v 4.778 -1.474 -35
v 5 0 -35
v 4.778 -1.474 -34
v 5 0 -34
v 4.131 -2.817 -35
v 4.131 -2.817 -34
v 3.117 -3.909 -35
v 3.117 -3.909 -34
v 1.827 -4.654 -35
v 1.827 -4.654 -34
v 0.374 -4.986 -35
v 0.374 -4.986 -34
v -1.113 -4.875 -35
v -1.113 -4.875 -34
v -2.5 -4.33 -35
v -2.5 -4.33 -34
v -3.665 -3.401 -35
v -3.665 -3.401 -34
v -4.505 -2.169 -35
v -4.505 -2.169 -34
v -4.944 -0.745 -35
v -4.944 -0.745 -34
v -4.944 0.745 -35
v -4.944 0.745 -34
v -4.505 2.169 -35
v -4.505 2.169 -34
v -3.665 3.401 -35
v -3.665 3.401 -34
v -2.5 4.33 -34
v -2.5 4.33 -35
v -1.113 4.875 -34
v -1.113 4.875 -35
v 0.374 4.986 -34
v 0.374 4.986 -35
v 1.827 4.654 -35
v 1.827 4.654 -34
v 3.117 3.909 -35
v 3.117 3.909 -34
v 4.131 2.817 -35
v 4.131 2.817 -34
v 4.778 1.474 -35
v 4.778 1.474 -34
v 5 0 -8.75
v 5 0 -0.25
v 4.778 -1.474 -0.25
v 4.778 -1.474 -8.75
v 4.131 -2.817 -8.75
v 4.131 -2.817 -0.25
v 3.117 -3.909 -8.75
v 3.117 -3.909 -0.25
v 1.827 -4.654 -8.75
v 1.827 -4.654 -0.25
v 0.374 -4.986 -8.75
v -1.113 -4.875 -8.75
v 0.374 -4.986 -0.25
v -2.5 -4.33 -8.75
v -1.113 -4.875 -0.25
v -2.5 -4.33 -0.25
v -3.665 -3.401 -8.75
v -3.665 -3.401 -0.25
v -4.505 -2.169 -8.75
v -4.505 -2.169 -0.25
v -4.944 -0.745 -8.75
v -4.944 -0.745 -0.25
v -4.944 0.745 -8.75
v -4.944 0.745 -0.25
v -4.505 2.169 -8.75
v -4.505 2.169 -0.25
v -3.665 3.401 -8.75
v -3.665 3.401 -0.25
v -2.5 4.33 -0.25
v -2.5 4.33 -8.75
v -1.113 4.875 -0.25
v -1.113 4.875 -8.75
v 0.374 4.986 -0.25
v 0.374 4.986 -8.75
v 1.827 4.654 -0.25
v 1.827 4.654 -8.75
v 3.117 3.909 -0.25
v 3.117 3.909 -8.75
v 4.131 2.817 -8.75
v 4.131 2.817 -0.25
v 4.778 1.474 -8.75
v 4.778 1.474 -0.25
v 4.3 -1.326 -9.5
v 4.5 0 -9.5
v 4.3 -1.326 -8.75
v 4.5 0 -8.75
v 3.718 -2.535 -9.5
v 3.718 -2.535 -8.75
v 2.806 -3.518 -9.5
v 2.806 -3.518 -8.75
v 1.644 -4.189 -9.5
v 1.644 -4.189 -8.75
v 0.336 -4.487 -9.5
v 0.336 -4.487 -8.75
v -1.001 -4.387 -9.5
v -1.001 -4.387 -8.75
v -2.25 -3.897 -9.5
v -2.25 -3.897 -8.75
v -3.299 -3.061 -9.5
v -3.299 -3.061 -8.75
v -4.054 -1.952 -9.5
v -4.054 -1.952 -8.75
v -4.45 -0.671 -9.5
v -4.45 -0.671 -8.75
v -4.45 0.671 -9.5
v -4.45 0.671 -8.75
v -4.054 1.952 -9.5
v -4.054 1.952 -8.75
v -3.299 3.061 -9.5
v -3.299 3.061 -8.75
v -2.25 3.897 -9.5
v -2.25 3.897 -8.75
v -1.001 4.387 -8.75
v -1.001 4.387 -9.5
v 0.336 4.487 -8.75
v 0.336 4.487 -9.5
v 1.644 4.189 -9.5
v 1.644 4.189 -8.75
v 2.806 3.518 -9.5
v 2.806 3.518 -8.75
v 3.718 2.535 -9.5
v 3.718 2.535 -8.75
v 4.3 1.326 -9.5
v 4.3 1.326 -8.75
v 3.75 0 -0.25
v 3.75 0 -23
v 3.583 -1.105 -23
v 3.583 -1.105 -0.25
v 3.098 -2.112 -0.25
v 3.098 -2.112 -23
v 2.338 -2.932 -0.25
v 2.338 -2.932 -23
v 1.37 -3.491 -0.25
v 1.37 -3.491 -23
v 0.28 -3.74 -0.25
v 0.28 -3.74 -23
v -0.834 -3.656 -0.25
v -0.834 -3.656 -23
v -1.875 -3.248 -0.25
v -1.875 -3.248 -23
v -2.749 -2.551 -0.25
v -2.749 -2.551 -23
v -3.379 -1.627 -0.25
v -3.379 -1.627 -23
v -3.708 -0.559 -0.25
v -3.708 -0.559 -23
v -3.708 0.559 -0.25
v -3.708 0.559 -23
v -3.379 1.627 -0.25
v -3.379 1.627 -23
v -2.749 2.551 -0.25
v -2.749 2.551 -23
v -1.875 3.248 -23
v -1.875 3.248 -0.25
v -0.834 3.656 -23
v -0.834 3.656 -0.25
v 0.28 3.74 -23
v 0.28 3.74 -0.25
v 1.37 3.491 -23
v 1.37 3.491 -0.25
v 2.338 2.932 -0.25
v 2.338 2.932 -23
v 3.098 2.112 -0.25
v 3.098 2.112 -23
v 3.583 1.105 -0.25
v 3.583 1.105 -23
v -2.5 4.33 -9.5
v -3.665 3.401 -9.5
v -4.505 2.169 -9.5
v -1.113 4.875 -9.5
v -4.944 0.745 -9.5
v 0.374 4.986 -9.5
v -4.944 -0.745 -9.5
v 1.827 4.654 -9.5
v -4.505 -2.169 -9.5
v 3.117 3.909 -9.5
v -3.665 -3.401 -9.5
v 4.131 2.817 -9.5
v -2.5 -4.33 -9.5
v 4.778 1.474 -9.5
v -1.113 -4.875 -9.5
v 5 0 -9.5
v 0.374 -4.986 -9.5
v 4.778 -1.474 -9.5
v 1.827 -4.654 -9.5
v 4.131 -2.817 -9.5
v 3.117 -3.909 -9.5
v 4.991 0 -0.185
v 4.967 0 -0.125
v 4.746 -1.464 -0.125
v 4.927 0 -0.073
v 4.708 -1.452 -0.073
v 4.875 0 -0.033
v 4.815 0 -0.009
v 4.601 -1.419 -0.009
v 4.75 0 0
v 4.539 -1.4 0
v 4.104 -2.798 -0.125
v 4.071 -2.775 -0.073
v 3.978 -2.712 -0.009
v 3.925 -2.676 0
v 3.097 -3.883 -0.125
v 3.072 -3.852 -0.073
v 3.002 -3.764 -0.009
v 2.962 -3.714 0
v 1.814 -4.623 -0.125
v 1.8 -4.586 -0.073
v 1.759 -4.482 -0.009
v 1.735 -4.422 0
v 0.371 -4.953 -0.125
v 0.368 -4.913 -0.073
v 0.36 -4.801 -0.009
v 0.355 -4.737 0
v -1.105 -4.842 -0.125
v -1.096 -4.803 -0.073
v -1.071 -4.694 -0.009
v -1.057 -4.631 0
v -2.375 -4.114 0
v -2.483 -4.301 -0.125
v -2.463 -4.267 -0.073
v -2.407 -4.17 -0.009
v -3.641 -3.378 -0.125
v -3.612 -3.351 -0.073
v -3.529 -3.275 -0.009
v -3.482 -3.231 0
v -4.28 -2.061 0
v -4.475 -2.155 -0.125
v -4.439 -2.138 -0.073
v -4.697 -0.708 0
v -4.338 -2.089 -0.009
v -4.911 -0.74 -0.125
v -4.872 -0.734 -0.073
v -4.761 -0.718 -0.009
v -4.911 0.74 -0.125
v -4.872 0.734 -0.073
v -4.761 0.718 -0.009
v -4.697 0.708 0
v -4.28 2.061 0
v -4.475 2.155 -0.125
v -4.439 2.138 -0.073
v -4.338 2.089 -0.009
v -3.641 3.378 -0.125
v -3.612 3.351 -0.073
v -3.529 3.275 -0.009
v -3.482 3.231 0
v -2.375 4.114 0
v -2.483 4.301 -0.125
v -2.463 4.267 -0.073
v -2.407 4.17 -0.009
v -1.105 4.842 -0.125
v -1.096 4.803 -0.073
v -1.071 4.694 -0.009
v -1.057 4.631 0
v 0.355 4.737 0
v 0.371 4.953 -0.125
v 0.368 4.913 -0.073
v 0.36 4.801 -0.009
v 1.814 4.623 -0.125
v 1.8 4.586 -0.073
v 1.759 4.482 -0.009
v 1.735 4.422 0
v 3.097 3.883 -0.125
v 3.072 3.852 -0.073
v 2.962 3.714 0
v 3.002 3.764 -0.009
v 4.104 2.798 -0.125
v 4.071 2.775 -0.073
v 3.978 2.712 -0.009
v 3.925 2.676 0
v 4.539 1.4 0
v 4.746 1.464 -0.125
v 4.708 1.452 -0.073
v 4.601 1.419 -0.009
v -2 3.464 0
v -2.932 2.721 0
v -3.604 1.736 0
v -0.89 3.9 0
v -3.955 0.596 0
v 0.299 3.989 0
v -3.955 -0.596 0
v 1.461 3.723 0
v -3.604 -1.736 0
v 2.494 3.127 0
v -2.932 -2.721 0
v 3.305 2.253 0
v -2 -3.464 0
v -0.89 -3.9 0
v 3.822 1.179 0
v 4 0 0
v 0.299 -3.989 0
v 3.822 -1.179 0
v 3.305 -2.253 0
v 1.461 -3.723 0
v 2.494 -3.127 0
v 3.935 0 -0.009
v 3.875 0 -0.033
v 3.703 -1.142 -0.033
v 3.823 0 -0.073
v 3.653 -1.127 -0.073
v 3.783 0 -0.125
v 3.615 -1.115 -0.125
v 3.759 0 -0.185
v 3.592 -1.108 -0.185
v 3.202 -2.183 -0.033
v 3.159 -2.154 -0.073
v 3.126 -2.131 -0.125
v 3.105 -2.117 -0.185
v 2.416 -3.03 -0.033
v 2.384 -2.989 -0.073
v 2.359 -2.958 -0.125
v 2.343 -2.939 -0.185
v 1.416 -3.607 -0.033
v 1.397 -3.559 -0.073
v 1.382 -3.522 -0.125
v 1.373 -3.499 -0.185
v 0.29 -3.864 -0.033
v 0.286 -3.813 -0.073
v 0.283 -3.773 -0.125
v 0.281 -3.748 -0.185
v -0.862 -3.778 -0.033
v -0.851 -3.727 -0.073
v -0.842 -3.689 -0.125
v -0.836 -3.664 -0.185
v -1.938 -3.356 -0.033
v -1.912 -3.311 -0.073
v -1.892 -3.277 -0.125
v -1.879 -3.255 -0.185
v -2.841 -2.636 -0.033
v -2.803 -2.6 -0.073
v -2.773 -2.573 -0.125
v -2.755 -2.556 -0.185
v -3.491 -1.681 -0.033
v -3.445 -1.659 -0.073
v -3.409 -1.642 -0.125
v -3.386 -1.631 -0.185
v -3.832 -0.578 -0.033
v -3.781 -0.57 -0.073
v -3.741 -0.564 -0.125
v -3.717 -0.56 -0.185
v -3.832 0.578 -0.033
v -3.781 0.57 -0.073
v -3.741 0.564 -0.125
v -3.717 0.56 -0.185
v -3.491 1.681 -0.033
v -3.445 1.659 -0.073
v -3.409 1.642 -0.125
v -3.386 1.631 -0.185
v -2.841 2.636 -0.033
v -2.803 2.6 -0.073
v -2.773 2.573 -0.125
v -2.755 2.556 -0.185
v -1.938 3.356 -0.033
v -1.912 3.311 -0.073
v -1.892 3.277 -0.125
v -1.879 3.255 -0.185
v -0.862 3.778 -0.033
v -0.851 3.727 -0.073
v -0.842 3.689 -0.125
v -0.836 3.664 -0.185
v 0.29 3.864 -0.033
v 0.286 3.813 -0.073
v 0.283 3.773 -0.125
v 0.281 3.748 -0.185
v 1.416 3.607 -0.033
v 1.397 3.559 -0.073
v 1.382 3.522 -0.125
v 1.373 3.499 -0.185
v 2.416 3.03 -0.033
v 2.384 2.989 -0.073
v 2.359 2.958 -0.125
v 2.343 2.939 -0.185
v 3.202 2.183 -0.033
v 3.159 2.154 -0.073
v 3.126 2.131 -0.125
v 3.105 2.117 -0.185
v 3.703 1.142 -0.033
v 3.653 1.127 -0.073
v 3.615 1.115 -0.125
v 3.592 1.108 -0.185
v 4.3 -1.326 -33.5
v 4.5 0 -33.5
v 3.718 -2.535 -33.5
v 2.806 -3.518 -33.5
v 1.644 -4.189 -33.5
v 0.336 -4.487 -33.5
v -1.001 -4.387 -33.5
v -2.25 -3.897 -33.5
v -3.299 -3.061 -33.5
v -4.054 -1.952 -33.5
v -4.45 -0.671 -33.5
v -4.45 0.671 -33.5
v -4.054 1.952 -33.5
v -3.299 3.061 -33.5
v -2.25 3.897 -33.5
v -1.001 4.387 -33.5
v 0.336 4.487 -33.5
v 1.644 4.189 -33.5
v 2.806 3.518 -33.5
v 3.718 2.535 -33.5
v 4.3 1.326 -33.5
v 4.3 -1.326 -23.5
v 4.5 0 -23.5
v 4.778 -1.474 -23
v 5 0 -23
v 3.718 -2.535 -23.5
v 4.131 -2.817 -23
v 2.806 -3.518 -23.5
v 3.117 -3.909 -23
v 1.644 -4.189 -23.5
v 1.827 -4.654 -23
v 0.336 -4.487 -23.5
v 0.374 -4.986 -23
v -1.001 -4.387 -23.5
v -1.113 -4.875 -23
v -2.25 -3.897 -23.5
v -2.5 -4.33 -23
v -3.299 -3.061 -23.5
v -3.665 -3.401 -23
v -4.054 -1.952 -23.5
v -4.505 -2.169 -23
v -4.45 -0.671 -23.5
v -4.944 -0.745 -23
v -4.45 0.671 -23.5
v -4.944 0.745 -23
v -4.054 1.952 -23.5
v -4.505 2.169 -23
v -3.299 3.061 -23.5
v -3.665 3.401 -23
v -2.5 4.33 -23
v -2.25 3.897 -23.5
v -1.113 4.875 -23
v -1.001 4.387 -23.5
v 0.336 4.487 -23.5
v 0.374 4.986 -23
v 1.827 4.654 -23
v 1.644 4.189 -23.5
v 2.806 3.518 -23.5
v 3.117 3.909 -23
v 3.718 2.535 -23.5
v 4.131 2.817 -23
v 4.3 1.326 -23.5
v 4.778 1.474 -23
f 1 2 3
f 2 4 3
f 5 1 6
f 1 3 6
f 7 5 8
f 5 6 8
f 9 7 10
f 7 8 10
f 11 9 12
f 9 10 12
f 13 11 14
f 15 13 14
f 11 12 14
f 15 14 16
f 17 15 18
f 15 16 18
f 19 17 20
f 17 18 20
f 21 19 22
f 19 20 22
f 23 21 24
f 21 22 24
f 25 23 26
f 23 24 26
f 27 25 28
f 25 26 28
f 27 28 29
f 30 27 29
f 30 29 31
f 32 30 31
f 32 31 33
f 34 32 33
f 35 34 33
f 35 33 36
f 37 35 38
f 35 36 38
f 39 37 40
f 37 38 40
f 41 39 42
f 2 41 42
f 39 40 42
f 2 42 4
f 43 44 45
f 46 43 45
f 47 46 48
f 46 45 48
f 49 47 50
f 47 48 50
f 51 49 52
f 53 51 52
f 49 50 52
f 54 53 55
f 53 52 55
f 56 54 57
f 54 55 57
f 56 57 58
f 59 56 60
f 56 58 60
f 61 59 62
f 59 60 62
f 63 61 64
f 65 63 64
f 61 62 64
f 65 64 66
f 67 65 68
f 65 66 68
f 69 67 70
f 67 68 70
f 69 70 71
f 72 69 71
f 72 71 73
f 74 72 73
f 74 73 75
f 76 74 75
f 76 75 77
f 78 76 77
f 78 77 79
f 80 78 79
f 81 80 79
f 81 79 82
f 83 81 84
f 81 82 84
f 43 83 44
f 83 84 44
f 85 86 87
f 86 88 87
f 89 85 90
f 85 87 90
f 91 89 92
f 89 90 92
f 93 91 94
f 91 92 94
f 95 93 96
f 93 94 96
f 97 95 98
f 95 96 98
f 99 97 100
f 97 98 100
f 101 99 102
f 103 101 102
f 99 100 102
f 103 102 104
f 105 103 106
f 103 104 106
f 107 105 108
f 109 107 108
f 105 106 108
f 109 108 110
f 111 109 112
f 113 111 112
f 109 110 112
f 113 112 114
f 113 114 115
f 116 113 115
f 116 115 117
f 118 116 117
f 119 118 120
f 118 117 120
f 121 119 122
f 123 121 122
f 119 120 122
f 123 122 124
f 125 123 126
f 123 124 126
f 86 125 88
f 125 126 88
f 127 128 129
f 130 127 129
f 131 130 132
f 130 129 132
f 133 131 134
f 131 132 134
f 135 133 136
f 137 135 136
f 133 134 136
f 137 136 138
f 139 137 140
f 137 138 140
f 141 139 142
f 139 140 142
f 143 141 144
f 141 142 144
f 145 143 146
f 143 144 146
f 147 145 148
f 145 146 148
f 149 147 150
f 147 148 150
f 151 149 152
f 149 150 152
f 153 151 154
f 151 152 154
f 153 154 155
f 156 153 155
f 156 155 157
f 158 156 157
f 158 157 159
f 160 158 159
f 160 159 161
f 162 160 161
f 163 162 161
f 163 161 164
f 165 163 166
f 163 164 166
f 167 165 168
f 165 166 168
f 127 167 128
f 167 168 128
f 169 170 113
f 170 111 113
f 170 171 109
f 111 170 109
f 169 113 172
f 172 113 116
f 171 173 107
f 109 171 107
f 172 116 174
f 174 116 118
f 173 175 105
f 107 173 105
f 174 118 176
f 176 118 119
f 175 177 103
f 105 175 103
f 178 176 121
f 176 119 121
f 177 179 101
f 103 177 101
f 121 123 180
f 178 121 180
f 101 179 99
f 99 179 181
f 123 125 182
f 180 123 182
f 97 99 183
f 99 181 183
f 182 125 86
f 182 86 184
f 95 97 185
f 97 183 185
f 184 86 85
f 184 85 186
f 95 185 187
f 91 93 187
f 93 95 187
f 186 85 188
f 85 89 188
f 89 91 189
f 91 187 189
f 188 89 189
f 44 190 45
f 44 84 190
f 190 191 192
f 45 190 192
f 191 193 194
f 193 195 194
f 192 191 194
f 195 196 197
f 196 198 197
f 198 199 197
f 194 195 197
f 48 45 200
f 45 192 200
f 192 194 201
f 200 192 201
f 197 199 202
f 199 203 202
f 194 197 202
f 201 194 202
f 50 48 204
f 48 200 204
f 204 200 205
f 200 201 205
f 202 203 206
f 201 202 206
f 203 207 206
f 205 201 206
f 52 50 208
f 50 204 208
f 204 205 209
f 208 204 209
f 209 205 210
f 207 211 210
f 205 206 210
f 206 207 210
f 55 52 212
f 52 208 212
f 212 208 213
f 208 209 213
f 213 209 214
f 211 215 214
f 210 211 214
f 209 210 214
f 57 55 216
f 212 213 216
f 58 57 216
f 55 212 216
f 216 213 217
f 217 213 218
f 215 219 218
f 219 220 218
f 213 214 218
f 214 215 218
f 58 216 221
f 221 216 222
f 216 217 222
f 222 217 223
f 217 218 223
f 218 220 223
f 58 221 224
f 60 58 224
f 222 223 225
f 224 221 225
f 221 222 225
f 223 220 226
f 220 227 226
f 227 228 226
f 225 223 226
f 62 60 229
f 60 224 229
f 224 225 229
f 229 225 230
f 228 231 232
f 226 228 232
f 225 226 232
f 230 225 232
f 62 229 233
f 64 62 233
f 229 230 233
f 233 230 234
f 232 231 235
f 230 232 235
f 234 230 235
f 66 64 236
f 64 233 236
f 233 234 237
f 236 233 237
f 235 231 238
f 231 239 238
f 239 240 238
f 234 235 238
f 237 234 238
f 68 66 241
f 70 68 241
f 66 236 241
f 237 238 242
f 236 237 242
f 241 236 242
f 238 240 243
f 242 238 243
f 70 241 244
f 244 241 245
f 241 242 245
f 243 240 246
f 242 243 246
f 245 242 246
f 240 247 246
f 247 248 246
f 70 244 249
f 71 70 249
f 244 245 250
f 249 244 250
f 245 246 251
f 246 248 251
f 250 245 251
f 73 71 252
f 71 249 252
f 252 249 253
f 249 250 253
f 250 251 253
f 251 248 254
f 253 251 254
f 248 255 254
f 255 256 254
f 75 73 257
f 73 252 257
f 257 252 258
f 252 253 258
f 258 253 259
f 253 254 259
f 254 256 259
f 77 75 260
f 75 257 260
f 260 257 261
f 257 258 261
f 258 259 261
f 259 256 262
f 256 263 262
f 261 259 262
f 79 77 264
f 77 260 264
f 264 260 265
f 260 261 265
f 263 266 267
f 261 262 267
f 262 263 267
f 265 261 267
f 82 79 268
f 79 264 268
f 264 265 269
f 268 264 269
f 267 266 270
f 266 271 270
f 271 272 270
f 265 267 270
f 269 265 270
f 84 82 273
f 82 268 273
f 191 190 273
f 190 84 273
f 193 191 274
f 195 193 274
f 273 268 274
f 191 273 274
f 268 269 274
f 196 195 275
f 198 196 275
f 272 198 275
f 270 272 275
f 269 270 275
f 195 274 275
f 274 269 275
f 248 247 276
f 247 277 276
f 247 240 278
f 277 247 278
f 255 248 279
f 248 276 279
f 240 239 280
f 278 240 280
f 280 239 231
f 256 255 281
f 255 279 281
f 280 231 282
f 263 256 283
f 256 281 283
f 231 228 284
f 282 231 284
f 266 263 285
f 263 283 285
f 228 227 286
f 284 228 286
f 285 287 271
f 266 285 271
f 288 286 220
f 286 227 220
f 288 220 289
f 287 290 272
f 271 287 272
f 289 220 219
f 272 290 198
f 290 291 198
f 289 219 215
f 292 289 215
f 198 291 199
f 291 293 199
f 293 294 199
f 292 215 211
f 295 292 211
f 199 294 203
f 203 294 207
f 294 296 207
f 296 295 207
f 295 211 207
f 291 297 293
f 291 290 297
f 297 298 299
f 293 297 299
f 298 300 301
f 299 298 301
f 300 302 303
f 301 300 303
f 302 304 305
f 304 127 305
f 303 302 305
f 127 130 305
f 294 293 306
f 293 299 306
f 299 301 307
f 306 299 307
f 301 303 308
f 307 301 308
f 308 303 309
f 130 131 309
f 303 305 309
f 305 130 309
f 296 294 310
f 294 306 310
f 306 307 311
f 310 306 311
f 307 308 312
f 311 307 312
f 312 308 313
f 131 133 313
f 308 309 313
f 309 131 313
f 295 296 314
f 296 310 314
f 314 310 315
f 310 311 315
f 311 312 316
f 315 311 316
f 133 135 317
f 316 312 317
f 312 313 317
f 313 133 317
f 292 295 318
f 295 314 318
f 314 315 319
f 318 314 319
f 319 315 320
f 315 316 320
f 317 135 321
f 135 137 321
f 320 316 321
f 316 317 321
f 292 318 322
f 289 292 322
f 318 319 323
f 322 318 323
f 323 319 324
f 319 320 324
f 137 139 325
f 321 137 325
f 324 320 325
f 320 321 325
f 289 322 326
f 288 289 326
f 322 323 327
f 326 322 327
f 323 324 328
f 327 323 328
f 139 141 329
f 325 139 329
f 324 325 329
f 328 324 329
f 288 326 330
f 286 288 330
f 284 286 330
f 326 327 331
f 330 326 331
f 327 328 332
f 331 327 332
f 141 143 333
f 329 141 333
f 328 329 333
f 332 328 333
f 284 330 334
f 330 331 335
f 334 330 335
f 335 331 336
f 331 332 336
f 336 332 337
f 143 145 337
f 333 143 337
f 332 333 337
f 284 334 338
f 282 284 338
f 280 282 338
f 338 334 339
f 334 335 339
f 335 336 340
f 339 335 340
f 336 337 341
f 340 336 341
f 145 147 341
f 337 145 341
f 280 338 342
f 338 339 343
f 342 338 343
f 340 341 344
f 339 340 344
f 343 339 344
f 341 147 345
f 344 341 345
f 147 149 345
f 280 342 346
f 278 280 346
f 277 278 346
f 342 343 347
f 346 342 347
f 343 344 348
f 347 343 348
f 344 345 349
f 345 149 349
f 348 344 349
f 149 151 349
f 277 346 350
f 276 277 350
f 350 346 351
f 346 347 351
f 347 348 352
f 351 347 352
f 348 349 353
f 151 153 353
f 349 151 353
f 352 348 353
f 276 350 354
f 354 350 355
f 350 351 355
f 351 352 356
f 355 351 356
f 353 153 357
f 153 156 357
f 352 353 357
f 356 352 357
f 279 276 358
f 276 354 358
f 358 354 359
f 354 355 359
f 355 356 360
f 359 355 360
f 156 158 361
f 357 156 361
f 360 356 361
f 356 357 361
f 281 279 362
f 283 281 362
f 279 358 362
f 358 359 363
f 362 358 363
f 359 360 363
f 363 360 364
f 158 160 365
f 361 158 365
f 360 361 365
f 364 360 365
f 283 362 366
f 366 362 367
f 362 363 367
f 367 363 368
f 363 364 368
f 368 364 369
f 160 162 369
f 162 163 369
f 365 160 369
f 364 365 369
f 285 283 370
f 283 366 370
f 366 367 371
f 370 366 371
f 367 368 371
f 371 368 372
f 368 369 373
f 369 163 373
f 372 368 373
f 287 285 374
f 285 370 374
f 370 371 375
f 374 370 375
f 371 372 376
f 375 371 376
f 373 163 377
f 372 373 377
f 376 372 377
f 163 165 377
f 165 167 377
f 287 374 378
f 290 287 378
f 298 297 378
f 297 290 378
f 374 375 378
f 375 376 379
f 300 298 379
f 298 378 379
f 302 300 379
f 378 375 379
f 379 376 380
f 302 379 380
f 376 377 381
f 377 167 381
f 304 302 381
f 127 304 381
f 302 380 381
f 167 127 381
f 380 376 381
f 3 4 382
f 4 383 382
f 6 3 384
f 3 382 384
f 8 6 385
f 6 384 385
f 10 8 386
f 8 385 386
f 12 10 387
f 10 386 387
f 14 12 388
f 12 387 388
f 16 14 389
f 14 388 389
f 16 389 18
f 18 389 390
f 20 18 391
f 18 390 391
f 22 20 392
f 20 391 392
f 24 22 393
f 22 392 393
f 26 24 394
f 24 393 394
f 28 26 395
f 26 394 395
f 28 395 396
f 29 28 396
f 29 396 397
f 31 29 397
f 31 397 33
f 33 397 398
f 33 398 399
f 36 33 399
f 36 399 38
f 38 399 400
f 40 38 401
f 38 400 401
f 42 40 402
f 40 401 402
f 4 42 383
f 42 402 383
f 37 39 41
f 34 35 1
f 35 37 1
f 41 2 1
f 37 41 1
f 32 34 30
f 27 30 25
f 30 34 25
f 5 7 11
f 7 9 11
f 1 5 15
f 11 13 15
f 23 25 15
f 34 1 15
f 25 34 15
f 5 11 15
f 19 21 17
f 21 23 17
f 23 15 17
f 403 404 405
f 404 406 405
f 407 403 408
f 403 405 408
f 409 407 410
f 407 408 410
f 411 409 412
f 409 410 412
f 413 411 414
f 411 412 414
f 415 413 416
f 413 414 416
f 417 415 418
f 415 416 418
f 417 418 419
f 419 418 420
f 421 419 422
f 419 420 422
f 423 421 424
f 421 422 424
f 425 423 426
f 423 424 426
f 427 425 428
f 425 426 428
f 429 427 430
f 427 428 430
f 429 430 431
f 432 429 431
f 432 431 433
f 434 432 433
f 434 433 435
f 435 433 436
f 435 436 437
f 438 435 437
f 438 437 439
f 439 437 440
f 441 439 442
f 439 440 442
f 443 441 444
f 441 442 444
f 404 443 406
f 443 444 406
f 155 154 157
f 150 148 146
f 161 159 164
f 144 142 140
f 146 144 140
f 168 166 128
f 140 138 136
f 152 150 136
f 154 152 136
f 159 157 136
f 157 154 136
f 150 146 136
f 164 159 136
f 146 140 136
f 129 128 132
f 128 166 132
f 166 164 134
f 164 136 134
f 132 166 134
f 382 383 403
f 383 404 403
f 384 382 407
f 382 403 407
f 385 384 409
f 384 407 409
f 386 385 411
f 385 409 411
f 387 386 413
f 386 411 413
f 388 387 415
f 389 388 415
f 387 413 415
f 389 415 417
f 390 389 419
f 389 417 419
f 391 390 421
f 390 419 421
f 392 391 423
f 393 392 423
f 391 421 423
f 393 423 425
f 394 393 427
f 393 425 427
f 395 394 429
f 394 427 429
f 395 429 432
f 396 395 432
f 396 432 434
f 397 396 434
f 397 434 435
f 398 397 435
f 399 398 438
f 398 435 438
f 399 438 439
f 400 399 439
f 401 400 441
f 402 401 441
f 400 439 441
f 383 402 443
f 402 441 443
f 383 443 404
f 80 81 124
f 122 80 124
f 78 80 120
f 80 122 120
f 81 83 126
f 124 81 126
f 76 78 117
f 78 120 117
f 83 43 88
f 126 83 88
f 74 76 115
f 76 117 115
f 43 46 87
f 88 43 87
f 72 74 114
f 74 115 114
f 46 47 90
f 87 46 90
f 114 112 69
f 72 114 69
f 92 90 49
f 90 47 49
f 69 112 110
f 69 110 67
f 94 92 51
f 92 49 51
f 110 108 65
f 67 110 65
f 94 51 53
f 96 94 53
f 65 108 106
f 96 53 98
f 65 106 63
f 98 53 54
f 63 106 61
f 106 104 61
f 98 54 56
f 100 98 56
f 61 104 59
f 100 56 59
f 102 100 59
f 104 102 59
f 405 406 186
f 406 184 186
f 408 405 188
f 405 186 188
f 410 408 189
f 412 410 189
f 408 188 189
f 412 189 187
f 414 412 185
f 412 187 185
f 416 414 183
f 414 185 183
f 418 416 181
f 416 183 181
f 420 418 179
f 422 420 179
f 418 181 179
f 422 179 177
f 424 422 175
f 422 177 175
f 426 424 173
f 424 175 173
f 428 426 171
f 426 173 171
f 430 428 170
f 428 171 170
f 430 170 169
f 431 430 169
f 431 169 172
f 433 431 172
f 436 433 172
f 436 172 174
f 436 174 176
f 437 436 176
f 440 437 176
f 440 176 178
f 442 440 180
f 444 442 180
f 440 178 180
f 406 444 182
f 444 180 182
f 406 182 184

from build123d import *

# Parameters (mm, degrees)
FILLET_1_R = 0.25


with BuildPart() as part:
    # Эскиз1 → Повернуть1 (revolve)
    with BuildSketch(Plane(origin=(0, 0, 0), x_dir=(0, 0, -1), z_dir=(1, 0, 0)), mode=Mode.PRIVATE) as revolve_1_sk:
        Polygon((23, 0), (35, 0), (35, 5), (34, 5), (33.5, 4.5), (23.5, 4.5), (23, 5), (9.5, 5), (9.5, 4.5), (8.75, 4.5), (8.75, 5), (0, 5), (0, 3.75), (23, 3.75), align=None)
    revolve(revolve_1_sk.sketch.rotate(Axis((0, 0, -23), (0, 0, -1)), 90), axis=Axis((0, 0, -23), (0, 0, -1)))

    # Скругление1
    fillet_1_edges = [part.edges().sort_by_distance(p)[0] for p in [
        (-3.75, 0, 0),
        (-5, 0, 0),
    ]]
    fillet(fillet_1_edges, radius=FILLET_1_R)


solid = part.part
